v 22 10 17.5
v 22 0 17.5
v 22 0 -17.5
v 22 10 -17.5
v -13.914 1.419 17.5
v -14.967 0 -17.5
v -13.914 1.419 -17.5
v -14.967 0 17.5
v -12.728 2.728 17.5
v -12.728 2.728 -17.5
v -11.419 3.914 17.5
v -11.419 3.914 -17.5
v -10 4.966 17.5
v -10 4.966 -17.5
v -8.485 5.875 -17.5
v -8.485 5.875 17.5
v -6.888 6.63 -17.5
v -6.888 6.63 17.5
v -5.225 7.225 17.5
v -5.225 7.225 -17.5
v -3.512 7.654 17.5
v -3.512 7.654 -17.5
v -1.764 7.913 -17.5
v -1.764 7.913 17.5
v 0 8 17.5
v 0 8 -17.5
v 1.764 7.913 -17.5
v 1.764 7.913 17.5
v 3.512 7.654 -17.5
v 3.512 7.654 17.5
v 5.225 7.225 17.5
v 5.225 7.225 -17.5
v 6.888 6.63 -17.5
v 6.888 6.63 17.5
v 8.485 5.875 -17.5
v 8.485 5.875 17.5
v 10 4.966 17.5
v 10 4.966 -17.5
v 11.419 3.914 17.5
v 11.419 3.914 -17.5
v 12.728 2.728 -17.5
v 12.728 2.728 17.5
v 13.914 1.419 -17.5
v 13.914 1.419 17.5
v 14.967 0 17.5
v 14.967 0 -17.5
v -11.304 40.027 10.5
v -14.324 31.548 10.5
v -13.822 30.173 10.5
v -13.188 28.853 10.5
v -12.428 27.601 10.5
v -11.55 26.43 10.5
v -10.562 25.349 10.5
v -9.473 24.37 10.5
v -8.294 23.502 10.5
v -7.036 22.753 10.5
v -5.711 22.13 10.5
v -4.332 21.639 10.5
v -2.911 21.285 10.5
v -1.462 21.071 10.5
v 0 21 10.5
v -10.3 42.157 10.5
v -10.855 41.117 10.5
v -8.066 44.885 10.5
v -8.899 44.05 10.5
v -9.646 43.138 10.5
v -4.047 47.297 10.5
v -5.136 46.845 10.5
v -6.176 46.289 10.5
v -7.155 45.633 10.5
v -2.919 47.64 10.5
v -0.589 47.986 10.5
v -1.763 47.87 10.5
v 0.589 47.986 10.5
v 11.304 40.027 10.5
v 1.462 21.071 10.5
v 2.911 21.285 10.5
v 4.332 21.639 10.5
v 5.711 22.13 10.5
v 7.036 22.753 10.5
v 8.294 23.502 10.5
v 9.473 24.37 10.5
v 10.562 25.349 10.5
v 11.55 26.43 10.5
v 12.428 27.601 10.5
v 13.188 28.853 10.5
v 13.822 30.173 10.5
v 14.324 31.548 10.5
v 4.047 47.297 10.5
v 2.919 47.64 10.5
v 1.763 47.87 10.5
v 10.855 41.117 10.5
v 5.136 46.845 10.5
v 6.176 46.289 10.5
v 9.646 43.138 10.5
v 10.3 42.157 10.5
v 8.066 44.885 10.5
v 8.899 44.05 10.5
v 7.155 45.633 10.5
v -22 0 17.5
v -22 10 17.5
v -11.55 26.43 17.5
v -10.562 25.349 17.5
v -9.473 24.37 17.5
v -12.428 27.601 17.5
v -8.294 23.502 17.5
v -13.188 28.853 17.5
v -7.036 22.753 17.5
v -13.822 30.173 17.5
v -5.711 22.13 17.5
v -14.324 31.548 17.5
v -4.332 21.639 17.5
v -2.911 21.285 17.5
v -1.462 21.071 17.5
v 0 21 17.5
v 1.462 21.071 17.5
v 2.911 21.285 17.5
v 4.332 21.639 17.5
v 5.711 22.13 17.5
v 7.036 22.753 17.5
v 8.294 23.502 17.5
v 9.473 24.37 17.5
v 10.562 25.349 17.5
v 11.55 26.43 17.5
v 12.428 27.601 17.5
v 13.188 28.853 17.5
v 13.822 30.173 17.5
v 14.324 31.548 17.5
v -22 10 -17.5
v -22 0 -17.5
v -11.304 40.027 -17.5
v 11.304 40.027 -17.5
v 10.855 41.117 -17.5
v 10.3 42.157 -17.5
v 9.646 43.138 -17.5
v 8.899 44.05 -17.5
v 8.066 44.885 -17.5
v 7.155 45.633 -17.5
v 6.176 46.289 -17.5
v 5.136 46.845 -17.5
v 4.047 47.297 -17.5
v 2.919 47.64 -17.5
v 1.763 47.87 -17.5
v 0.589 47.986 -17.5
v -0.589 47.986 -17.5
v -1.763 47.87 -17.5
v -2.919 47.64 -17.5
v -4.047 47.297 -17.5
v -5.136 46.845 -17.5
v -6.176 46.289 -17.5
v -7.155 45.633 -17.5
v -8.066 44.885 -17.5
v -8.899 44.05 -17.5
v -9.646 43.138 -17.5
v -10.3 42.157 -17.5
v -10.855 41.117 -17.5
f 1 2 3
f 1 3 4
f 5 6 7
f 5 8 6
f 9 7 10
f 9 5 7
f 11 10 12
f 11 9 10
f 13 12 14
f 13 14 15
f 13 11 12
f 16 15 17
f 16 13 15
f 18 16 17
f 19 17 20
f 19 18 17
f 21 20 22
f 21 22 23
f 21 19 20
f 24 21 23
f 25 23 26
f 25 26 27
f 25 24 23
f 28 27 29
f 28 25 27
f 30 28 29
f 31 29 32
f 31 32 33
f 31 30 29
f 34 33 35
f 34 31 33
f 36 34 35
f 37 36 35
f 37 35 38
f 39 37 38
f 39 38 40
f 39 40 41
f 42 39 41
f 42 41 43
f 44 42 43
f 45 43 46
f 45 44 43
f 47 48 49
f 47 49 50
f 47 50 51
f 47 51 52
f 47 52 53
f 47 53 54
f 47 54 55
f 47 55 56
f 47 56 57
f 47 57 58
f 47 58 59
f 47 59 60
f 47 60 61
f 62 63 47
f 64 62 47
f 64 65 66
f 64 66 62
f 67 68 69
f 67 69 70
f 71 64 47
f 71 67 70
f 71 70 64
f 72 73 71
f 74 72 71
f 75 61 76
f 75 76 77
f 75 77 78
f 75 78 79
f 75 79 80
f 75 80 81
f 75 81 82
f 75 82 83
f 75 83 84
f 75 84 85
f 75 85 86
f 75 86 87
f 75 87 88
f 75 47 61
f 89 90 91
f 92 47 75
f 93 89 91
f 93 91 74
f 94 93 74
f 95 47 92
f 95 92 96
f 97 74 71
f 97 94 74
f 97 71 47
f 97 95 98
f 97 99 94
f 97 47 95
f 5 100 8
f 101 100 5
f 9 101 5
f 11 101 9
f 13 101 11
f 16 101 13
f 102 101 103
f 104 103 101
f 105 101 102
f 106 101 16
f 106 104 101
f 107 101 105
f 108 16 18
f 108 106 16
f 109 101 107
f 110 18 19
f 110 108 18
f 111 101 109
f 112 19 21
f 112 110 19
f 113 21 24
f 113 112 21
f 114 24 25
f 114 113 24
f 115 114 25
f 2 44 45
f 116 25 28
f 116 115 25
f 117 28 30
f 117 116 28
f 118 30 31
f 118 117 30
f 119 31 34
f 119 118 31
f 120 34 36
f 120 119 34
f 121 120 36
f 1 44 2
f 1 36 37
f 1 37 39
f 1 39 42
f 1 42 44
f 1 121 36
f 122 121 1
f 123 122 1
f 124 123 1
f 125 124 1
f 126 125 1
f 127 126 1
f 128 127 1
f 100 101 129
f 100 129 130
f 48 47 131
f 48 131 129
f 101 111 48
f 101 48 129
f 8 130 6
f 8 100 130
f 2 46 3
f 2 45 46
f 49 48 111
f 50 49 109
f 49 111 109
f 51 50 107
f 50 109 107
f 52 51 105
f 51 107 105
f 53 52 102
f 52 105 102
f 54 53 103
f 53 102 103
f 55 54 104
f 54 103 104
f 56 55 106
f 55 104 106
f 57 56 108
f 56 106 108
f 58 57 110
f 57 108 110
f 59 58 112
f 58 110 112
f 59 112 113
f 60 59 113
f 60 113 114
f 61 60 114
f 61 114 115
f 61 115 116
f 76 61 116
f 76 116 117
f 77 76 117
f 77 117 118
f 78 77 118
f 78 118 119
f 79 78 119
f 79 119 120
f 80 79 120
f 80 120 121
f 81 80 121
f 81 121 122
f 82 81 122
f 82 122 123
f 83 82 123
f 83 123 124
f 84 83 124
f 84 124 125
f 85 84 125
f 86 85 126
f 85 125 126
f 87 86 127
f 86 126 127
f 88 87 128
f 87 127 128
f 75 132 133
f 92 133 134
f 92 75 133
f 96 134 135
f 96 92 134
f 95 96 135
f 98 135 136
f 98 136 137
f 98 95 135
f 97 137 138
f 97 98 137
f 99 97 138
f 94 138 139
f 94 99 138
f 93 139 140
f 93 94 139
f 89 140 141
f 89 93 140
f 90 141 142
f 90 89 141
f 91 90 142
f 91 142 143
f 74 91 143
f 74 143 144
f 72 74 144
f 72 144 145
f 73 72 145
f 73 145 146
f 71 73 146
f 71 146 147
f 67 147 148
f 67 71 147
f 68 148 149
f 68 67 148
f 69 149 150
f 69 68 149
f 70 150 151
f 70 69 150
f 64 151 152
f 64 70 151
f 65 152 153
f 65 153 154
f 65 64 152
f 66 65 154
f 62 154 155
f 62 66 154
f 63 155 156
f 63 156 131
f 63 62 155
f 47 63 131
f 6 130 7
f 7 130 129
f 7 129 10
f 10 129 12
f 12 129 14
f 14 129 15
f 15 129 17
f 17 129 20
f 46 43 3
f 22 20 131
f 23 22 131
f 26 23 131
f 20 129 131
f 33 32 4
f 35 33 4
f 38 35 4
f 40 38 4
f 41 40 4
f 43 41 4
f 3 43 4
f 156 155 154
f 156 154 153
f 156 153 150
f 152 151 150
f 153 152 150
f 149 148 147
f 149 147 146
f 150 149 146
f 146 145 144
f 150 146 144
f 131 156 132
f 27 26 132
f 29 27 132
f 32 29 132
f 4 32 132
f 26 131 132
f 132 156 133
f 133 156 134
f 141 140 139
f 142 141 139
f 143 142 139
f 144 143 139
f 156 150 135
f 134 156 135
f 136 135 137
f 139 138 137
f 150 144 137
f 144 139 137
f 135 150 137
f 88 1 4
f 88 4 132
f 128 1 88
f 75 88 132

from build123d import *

# Parameters (mm, degrees)
BOSS_EXTRUDE1_DEPTH = 17.5
SKETCH2_R           = 15
CUT_EXTRUDE1_DEPTH  = 7


with BuildPart() as part:
    # Sketch1 → Boss-Extrude1 (new, symmetric)
    with BuildSketch(Plane.XY):
        with BuildLine():
            Line((14.966629547, 0), (22, 0))
            Line((22, 0), (22, 10))
            Line((22, 10), (11.304244422, 40.026668357))
            ThreePointArc((11.304244422, 40.026668357), (0, 48), (-11.304244422, 40.026668357))
            Line((-11.304244422, 40.026668357), (-22, 10))
            Line((-22, 10), (-22, 0))
            Line((-22, 0), (-14.966629547, 0))
            ThreePointArc((-14.966629547, 0), (0, 8), (14.966629547, 0))
        make_face()
    extrude(amount=BOSS_EXTRUDE1_DEPTH, both=True)

    # Sketch2 → Cut-Extrude1 (cut)
    with BuildSketch(Plane.XY.offset(17.5)):
        with Locations((0, 36)):
            Circle(SKETCH2_R)
    extrude(amount=-CUT_EXTRUDE1_DEPTH, mode=Mode.SUBTRACT)


solid = part.part
